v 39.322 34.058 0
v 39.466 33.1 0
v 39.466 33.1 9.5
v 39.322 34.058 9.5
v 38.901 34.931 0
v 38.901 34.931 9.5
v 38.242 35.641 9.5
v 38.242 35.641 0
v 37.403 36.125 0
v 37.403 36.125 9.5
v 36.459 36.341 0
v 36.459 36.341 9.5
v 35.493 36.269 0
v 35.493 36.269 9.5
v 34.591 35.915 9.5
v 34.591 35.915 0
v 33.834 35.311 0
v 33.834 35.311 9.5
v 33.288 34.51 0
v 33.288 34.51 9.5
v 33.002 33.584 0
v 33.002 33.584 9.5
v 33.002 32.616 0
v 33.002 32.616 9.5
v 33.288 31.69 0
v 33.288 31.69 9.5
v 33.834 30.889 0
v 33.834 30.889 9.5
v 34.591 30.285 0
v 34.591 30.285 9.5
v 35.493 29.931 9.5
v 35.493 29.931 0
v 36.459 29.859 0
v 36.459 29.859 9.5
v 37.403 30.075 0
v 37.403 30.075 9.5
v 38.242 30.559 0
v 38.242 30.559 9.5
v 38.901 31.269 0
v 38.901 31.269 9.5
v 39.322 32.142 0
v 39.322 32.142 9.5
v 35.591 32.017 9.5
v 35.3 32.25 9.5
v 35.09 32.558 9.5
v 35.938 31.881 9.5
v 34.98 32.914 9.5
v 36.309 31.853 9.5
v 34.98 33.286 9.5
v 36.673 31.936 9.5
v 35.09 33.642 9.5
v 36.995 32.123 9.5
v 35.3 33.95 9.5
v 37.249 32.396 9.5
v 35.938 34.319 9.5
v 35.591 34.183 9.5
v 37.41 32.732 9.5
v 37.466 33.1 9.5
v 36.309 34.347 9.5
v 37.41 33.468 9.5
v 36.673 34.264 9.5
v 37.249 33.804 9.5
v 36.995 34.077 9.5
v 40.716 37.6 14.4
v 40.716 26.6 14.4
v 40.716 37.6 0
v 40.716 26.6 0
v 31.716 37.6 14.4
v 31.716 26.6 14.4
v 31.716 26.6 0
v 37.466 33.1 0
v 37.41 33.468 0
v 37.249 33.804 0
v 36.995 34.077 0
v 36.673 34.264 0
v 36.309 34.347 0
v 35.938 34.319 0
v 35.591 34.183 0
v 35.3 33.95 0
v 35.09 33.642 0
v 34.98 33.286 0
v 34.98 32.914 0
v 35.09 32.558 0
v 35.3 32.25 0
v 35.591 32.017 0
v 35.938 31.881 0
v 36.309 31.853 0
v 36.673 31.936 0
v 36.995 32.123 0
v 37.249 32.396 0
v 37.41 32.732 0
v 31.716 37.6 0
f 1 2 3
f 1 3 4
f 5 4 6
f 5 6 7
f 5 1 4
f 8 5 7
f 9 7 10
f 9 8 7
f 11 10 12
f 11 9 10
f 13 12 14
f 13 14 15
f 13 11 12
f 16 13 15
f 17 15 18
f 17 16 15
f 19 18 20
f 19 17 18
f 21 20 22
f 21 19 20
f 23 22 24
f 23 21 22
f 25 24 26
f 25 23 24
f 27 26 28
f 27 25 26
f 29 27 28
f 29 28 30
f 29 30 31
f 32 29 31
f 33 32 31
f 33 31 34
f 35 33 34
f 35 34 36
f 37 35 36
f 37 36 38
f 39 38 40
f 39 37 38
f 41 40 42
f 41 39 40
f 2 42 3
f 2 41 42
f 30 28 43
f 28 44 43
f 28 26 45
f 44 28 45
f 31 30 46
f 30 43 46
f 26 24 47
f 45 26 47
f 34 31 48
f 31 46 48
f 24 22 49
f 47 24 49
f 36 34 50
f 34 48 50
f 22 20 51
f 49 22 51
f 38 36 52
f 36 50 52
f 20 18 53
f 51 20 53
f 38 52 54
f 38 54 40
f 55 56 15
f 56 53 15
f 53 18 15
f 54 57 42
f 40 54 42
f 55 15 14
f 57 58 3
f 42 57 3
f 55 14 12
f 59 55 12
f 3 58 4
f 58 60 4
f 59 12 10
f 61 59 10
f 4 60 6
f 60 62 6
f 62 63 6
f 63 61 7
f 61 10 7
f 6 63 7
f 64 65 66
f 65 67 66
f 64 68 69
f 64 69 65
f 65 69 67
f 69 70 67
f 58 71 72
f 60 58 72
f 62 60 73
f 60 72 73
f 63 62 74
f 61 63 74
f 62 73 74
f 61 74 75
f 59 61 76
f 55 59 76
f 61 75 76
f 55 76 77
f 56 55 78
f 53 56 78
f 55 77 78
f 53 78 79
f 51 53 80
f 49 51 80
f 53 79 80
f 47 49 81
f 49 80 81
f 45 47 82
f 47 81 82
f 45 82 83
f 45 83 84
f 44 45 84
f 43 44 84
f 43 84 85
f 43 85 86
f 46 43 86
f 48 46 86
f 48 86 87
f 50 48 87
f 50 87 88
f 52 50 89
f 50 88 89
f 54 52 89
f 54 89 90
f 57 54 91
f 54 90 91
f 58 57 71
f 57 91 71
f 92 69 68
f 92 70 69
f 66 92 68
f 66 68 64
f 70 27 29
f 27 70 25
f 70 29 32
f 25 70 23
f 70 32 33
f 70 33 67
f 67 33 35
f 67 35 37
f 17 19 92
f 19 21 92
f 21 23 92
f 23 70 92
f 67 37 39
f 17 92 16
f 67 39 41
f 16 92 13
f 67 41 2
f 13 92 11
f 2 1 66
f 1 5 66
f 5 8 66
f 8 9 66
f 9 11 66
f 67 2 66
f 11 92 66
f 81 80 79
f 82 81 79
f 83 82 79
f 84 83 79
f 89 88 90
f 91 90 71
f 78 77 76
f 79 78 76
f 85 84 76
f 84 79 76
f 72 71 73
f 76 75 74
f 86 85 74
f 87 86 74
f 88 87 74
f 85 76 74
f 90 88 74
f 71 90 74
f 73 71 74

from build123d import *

# Parameters (mm, degrees)
SKETCH_1_W                               = 9
SKETCH_1_H                               = 11
SKETCH_1_R                               = 3.25
PJ002BH_9X11_FRONT_9P5MM_INSERTION_DEPTH = 9.5
JACK_REAR_BODY_14P4MM_TOTAL_START        = 9.5
SKETCH_2_W                               = 9
SKETCH_2_H                               = 11
JACK_REAR_BODY_14P4MM_TOTAL_DEPTH        = 4.9
SKETCH_3_R                               = 1.25
F_2P5MM_CENTRE_PIN_DEPTH                 = 9.5


with BuildPart() as part:
    # 草图1 → PJ002BH_9x11_front_9p5mm_insertion (new body)
    with BuildSketch(Plane.XY):
        with Locations((36.216, 32.1)):
            Rectangle(SKETCH_1_W, SKETCH_1_H)
        with Locations((36.216, 33.1)):
            Circle(SKETCH_1_R, mode=Mode.SUBTRACT)
    extrude(amount=PJ002BH_9X11_FRONT_9P5MM_INSERTION_DEPTH)

    # 草图2 → Jack_rear_body_14p4mm_total (add)
    with BuildSketch(Plane.XY.offset(JACK_REAR_BODY_14P4MM_TOTAL_START)):
        with Locations((36.216, 32.1)):
            Rectangle(SKETCH_2_W, SKETCH_2_H)
    extrude(amount=JACK_REAR_BODY_14P4MM_TOTAL_DEPTH)

    # 草图3 → 2p5mm_centre_pin (add)
    with BuildSketch(Plane.XY):
        with Locations((36.216, 33.1)):
            Circle(SKETCH_3_R)
    extrude(amount=F_2P5MM_CENTRE_PIN_DEPTH)


solid = part.part
